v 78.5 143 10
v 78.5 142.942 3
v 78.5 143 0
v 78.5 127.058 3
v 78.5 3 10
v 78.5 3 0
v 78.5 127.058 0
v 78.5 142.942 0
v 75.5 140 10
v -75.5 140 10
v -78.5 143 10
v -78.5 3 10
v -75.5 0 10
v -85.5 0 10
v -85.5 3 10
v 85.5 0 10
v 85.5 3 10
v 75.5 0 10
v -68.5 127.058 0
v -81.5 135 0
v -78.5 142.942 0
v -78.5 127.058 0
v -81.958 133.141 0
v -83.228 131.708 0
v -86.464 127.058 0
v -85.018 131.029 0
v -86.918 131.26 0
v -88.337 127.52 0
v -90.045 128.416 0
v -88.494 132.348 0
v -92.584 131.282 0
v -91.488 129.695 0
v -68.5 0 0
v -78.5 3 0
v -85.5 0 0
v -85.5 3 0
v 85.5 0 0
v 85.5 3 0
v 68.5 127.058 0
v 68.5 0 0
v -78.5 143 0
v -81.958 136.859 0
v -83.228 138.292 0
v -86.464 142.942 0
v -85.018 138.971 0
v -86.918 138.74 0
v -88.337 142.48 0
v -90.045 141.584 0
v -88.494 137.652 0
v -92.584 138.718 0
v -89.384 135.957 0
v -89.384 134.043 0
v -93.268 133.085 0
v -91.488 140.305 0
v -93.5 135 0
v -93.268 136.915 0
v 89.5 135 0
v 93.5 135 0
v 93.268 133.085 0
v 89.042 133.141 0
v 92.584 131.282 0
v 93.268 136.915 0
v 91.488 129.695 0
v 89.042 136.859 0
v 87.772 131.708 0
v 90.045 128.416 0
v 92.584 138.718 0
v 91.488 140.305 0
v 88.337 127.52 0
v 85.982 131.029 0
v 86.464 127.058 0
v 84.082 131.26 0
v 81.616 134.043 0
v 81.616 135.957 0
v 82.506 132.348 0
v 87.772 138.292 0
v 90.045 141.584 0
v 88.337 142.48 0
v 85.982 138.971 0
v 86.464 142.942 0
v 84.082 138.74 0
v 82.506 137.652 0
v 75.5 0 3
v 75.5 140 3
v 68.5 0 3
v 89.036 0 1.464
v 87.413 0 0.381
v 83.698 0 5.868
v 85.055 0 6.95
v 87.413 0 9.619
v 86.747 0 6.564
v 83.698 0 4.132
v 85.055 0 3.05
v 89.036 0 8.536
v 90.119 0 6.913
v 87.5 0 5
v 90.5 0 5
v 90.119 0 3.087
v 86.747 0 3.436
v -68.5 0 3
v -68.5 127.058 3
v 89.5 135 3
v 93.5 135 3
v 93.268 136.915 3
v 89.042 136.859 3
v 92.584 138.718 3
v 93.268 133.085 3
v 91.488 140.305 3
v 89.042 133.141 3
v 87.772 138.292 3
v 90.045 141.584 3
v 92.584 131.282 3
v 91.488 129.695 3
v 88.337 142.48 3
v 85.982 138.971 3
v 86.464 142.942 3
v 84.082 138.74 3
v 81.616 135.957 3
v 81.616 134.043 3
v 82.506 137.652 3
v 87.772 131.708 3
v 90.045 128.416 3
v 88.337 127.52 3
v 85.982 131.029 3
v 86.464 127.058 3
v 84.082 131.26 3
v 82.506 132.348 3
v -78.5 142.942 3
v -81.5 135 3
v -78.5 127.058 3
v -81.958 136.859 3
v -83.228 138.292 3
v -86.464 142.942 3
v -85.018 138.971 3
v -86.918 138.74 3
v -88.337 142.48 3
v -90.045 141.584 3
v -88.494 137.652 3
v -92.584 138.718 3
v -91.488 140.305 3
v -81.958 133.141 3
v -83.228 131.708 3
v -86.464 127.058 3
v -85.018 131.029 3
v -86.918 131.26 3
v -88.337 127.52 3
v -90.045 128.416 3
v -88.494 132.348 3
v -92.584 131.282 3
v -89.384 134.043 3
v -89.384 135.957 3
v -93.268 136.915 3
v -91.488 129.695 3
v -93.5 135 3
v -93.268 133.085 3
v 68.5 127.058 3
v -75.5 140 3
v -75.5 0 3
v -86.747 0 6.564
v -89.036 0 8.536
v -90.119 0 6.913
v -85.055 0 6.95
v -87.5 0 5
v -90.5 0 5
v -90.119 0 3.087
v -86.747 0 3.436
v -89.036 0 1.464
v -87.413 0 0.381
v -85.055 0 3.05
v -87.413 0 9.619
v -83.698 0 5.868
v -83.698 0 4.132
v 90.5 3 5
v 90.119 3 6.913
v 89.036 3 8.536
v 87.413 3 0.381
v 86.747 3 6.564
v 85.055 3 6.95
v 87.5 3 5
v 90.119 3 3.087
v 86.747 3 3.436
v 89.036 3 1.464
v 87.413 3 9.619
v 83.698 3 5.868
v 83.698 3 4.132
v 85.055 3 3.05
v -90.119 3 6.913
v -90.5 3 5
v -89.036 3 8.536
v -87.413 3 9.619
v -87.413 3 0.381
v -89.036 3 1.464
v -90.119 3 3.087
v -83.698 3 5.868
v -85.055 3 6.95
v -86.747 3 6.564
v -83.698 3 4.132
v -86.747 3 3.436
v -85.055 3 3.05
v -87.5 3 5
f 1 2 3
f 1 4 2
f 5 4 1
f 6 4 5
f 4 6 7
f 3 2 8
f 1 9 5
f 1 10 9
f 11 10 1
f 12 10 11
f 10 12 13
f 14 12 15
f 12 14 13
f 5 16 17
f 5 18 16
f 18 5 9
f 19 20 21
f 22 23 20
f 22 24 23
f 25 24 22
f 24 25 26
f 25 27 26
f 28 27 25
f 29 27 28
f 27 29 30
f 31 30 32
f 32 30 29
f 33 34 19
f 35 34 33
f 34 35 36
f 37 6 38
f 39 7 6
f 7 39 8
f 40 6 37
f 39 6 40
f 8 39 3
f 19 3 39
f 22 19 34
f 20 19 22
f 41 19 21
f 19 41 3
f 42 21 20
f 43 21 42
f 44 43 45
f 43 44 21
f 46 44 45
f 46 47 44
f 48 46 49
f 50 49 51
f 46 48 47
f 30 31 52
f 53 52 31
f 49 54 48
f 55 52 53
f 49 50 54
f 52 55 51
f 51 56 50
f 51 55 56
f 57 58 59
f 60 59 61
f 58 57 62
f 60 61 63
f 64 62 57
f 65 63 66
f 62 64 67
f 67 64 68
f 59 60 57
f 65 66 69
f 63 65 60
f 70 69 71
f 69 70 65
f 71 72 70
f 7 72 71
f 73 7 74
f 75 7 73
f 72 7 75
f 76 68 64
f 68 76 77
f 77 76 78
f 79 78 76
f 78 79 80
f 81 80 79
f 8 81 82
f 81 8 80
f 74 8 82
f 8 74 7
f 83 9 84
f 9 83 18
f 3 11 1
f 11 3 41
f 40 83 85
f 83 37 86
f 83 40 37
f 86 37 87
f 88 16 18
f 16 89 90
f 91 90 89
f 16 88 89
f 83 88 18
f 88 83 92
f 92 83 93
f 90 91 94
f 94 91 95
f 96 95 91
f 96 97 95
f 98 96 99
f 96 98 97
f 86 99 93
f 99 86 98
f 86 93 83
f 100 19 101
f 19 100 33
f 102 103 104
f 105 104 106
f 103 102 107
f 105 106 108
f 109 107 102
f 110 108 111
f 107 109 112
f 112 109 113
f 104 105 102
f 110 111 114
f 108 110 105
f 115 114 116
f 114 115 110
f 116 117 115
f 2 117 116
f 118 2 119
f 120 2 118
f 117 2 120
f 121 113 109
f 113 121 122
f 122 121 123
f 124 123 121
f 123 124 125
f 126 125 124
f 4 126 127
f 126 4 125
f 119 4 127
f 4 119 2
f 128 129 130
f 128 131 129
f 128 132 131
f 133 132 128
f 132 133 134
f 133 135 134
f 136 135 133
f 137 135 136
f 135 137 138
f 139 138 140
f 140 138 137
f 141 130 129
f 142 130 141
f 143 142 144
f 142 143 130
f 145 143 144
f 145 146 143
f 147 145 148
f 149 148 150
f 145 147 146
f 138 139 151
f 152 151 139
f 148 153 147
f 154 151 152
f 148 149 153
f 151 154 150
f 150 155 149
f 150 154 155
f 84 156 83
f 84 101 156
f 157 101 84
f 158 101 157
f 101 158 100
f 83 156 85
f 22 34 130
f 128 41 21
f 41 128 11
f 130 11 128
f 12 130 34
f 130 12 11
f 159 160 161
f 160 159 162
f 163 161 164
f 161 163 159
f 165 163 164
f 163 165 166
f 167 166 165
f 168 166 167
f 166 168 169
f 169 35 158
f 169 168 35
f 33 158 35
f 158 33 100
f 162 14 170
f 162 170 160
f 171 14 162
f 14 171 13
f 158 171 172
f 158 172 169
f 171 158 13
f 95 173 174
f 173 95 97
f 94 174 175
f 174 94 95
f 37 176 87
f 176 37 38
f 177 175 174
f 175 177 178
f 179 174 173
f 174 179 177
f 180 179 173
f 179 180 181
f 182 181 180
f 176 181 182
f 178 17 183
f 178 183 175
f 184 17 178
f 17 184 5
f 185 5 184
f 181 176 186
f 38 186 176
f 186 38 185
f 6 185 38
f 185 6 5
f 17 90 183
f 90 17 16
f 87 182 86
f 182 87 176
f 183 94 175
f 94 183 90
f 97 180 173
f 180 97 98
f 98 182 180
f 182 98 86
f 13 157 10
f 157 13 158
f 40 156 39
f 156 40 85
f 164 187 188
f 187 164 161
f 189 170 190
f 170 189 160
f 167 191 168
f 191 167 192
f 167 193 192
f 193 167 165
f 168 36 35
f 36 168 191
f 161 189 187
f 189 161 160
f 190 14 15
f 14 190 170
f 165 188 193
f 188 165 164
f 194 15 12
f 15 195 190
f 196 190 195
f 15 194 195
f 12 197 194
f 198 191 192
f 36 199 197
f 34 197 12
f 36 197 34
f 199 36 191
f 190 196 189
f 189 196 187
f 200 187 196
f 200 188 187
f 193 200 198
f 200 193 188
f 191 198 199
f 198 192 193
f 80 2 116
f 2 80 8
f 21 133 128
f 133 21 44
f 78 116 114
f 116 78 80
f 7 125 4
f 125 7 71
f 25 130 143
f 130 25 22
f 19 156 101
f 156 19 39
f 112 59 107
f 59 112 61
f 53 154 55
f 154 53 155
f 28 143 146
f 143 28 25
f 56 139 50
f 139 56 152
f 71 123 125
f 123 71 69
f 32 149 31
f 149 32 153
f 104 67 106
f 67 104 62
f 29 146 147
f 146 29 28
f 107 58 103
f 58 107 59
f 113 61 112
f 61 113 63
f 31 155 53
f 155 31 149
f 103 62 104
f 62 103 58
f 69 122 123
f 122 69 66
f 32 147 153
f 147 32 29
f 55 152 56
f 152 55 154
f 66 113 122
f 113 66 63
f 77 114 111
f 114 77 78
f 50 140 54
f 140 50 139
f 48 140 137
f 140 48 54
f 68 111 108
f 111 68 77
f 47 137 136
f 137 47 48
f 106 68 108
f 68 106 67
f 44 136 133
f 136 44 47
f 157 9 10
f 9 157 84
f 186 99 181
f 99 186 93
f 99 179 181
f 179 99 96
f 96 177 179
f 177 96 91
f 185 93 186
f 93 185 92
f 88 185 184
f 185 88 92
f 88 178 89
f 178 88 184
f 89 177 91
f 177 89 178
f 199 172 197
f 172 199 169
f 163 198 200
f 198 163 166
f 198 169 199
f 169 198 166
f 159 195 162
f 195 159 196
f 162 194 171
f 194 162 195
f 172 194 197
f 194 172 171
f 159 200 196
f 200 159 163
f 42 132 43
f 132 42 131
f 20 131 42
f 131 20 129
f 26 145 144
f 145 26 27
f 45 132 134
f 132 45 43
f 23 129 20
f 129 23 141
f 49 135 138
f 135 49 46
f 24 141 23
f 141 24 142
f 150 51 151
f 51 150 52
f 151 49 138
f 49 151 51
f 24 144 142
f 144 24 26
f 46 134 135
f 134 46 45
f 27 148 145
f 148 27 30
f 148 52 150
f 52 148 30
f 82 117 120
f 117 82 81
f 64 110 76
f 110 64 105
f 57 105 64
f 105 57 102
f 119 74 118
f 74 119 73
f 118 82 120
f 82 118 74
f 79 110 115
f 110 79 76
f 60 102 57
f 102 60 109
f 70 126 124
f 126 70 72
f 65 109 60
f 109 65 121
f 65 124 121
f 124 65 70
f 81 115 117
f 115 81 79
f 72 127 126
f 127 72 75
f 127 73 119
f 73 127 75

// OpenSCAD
// file: ../config.scad
r4 = 2.2;
r8 = 4.2;
r10 = 5.2;

layer_height = 0.25;

switch_d = 9.6;

nema17_r_vis = 15.5;
nema17_r_centre = 11.5;
nema17_h_centre = 2;
nema17_h = 43;
nema17_l = 40;

boite_ui_largeur = 28.5;
boite_ui_l = 46;

support_laser = 24;

r3 = 1.75;
r3_2d = 1.5;
r3_vis = 1.65;
r3_head = 3.6;
m3_r = r3;
m3_nut_d = 7;
m3_nut_d2 = 6.2;
m3_nut_h = 3;

m4_nut_d = 8;
m4_nut_d2 = 7;
m4_nut_h = 4;

608_r = 23/2;
608_h = 8;

laser_printer_l = 609;
laser_printer_lg = 456;

module support_nut(d=3, l_screw1 = 20, l_screw2 = 20, l_nut = 20, h_screw2 = -0.1){
    if(d==3){
        screw_r = r3;
        nut_r = m3_nut_d/2;
        nut_h = m3_nut_h;
        cylinder(nut_h, r = nut_r, $fn = 6, center = true);
        translate([0, 0, -l_screw1])cylinder(l_screw1 +1, r = screw_r);
        translate([0, 0, m3_nut_h/2+ h_screw2])cylinder(l_screw2, r = screw_r);
        l = m3_nut_d*cos(30);
        translate([0, -l/2, -nut_h/2]) cube([l_nut, l,nut_h]);
    } else if(d==4){
        screw_r = r4;
        nut_r = m4_nut_d/2;
        nut_h = m4_nut_h;
        cylinder(nut_h, r = nut_r, $fn = 6, center = true);
        translate([0, 0, -l_screw1])cylinder(l_screw1 +1, r = screw_r);
        translate([0, 0, m4_nut_h/2+ h_screw2])cylinder(l_screw2, r = screw_r);
        l = m4_nut_d*cos(30);
        translate([0, -l/2, -nut_h/2]) cube([l_nut, l,nut_h]);
    }
}


module nut(d=3, center = false){
    nut_r = m3_nut_d/2;
    nut_h = m3_nut_h;
    if(d==3){
        nut_r = m3_nut_d/2;
        nut_h = m3_nut_h;
    } 
    cylinder(nut_h, r = nut_r, $fn = 6, center = center);
}



module m3(h, nut = false, head = false){
    cylinder(h, m3_r, m3_r, $fn=16);
    if(nut){
        cylinder(m3_nut_h, r = m3_nut_d/2, $fn = 6);
    }
}

module m3_nut(h){
    cylinder(m3_nut_h, r = m3_nut_d/2, $fn = 6);
    translate([0, -m3_nut_d2/2, 0]) cube([h, m3_nut_d2, m3_nut_h]);
}

m4_r = 2.3;
m4_nut_d = 8.4;
m4_nut_d2 = 7.5;
m4_nut_h = 3.5;
module m4(h, nut = false, head = false){
    cylinder(h, m4_r, m4_r);
    if(nut){
        cylinder(m4_nut_h, r = m4_nut_d/2, $fn = 6);
    }
}

module m5(h, nut = false, head = false){
    cylinder(h, r = 2.7);
}

m8_nut_d = 15;
m8_nut_d2 = 13;
m8_nut_h = 6.5;
module m8(h, nut = false, head = false){
    cylinder(h, r = r8);
    if(nut){
        cylinder(m8_nut_h, r = m8_nut_d/2, $fn = 6);
    }
}

module cube_arrondi(x, y, z, r=2){
    hull(){
        translate([(x/2-r), (y/2-r), 0]) cylinder(z,r=r);
        translate([(x/2-r), -(y/2-r), 0]) cylinder(z,r=r);
        translate([-(x/2-r), (y/2-r), 0]) cylinder(z,r=r);
        translate([-(x/2-r), -(y/2-r), 0]) cylinder(z,r=r);
    }
}

module demi_glissiere(r, l, h){
    cylinder(h, r, r);
    translate([-r, 0, 0]) cube([r*2, l, h]);
}


module nema17_2d(){
    nema17_l = 43;
    nema17_h = 6;
    polygon([[0,nema17_h], [nema17_h,0]
            , [nema17_l-nema17_h,0],[nema17_l,nema17_h]
            , [nema17_l,nema17_l-nema17_h],[nema17_l-nema17_h,nema17_l]
            , [8,nema17_l],[0,nema17_l-nema17_h] ]);
}

module nema17_2d2(){
    translate([nema17_r_vis, nema17_r_vis] ) circle(r3_2d);
    translate([nema17_r_vis, -nema17_r_vis] ) circle(r3_2d);
    translate([-nema17_r_vis, nema17_r_vis] ) circle(r3_2d);
    translate([-nema17_r_vis, -nema17_r_vis] ) circle(r3_2d);
    circle(nema17_r_centre);
}


module nema17(){
    translate([-nema17_h/2, -nema17_h/2, -nema17_l/2] ) linear_extrude(nema17_l) nema17_2d();
    
    h = nema17_h/2+6;
    translate([nema17_r_vis, nema17_r_vis, 0] )rotate([0, 0, 0]) cylinder(h, r = r3);
    translate([nema17_r_vis, -nema17_r_vis, 0] )rotate([0, 0, 0]) cylinder(h, r = r3);
    translate([-nema17_r_vis, nema17_r_vis, 0] )rotate([0, 0, 0]) cylinder(h, r = r3);
    translate([-nema17_r_vis, -nema17_r_vis, 0] )rotate([0, 0, 0]) cylinder(h, r = r3);
    cylinder(h, nema17_r_centre, nema17_r_centre);
    cylinder(h+14, r = 8);
    
    translate([-8.5, 0, -nema17_l/2] ) cube([17,30, 10]);
}

module corner(l_corner, h_corner, lg_corner){
    translate([0, lg_corner, 0]) rotate([90, 0, 0]) linear_extrude(lg_corner) polygon([[0,0], [l_corner, 0], [0, h_corner]]);
}


/**
 * 2D
 **/

module m3_2d(){
    circle(r3_2d);
}


module cran_x(_l, e, cran, inv){
    difference(){
        square([_l, e]);
        if(inv){
            for(i=[-round(_l/cran):round(_l/cran)]){
                translate([_l/2 + cran/2 - 2*i*cran, -1]) square([cran, e+2]);
            }
        }else{
            for(i=[-round(_l/cran):round(_l/cran)]){
                translate([_l/2 - cran/2 - 2*i*cran, -1]) square([cran, e+2]);
            }
        }
    }
}

module cran_y(_l, e, cran, inv){
    translate([e, 0]) rotate([0, 0, 90]) cran_x(_l, e, cran, inv); 
}

module whole_2d(type_vis){
    if(type_vis == 3){
        circle(1.5);
    } else if(type_vis == 4){
        circle(2);
    } else {
        echo("whole_2d " + type_vis);
    }
}

module nuts_2d(type_vis){
    if(type_vis == 3){
        translate([-1.5, 0])square([3, 20]);
        translate([-5.5/2, 10])square([5.5, 2.5]);
    } else if(type_vis == 4){
        translate([-2, 0])square([4, 30]);
        translate([-7/2, 20])square([7, 3.5]);
    } else {
        echo("nuts_2d " + type_vis);
    }
}

module cran_x_vis(_l, e, cran, type_vis = 3, trous = [0.1, 0.5, 0.9]){
    difference(){
        square([_l, e]);
        for(i=[-round(_l/cran):round(_l/cran)]){
                translate([_l/2 - cran/2 - 2*i*cran, -1]) square([cran, e+2]);
            }
        
    }
    for(i = trous){
        j = round((i-0.5)*_l/(2*cran));
        translate([_l/2  - 2*j*cran, e/2]) whole_2d(type_vis);
    }
}

module cran_x_nuts(_l, e, cran, type_vis = 3, trous = [0.1, 0.5, 0.9]){
    difference(){
        square([_l, e]);
        for(i=[-round(_l/cran):round(_l/cran)]){
                translate([_l/2 + cran/2 - 2*i*cran, -1]) square([cran, e+2]);
        }
    }
    for(i = trous){
        j = round((i-0.5)*_l/(2*cran));
        translate([_l/2  - 2*j*cran, e/2]) nuts_2d(type_vis);
    }
}

module cran_y_vis(_l, e, cran, type_vis = 3, trous = [0.1, 0.5, 0.9]){
    translate([e, 0]) rotate([0, 0, 90]) cran_x_vis(_l, e, cran, type_vis, trous);
}

module cran_y_nuts(_l, e, cran, type_vis = 3, trous = [0.1, 0.5, 0.9]){
    translate([0, _l]) rotate([0, 0, -90]) cran_x_nuts(_l, e, cran, type_vis, trous);
}
// main file
include <../config.scad>

alim_atx_l = 150;
alim_atx_lg = 140;
alim_atx_h = 86;

module alim_atx_trou(r = 1.5){
    translate([-alim_atx_l/2+6      , alim_atx_h-6]) circle(r, $fn=16);
    translate([-alim_atx_l/2+6+138  , alim_atx_h-6]) circle(r, $fn=16);
    translate([-alim_atx_l/2+6      , alim_atx_h-64-6]) circle(r, $fn=16);
    translate([-alim_atx_l/2+6+115  , alim_atx_h-80]) circle(r, $fn=16);
}

module alim_atx_2d(){
    alim_x_vis = 138;
    translate([-60, 5, 0]) square([120, 55]);
    translate([-alim_x_vis/2-5, 25, 0]) square([80, 35]);
    translate([alim_x_vis/2-5-90, 5, 0]) square([90, 70]);
    translate([0, 86, 0]) rotate([0,0,180]) alim_atx_trou();
}

module alim_atx_3d(){
    difference(){
        translate([-alim_atx_l/2, 0, 0])cube([alim_atx_l, alim_atx_h]);
        alim_atx_trou();
    }
}

module alim_atx_3d(){
    union(){
        translate([-alim_atx_l/2, 0, 0])cube([alim_atx_l, alim_atx_lg, alim_atx_h]);
        rotate([90,0,0])  linear_extrude(10){
            alim_atx_trou();
        }
        translate([-(alim_atx_l-alim_atx_lg)/2, alim_atx_lg/2, alim_atx_h]) cylinder(3, r = 120/2);
    }
}


h = 10;
e1 = 10;
e = 3;

l = 140;
lg = 151;

module alim_atx_support(){
    difference(){
        union(){
            hull(){
                translate([-lg/2-e1, l-8+e, 0])cylinder(e, r=8);
                translate([+lg/2+e1, l-8+e, 0])cylinder(e, r=8);
            }
            translate([-lg/2-e, l,0]) cube([lg+2*e, e, h]);
            for(i = [0,1]){
                mirror([i,0,0])translate([lg/2, 0,0]) cube([ e, l+e, h]);
                mirror([i,0,0])translate([-lg/2- e, 0,0]) cube([ h, l+e, e]);
                
                mirror([i,0,0]) translate([lg/2, 0, 0]) hull(){
                    cube([ e, e, h]);
                    translate([h, 0, h/2]) rotate([-90,0,0])cylinder(e, r=h/2);
                }
            }
            
        }
        translate([-lg/2-e1, l-8+e, -1]) cylinder(e+2, r=4);
        translate([+lg/2+e1, l-8+e, -1]) cylinder(e+2, r=4);
        for(i = [0,1]){
            mirror([i,0,0]) translate([lg/2 + h, -1, h/2]) rotate([-90,0,0])cylinder(e+2, r=2);
        }
    }
    %translate([0, 0, alim_atx_h+e]) rotate([0,180,0])alim_atx_3d();
}

alim_atx_support();
